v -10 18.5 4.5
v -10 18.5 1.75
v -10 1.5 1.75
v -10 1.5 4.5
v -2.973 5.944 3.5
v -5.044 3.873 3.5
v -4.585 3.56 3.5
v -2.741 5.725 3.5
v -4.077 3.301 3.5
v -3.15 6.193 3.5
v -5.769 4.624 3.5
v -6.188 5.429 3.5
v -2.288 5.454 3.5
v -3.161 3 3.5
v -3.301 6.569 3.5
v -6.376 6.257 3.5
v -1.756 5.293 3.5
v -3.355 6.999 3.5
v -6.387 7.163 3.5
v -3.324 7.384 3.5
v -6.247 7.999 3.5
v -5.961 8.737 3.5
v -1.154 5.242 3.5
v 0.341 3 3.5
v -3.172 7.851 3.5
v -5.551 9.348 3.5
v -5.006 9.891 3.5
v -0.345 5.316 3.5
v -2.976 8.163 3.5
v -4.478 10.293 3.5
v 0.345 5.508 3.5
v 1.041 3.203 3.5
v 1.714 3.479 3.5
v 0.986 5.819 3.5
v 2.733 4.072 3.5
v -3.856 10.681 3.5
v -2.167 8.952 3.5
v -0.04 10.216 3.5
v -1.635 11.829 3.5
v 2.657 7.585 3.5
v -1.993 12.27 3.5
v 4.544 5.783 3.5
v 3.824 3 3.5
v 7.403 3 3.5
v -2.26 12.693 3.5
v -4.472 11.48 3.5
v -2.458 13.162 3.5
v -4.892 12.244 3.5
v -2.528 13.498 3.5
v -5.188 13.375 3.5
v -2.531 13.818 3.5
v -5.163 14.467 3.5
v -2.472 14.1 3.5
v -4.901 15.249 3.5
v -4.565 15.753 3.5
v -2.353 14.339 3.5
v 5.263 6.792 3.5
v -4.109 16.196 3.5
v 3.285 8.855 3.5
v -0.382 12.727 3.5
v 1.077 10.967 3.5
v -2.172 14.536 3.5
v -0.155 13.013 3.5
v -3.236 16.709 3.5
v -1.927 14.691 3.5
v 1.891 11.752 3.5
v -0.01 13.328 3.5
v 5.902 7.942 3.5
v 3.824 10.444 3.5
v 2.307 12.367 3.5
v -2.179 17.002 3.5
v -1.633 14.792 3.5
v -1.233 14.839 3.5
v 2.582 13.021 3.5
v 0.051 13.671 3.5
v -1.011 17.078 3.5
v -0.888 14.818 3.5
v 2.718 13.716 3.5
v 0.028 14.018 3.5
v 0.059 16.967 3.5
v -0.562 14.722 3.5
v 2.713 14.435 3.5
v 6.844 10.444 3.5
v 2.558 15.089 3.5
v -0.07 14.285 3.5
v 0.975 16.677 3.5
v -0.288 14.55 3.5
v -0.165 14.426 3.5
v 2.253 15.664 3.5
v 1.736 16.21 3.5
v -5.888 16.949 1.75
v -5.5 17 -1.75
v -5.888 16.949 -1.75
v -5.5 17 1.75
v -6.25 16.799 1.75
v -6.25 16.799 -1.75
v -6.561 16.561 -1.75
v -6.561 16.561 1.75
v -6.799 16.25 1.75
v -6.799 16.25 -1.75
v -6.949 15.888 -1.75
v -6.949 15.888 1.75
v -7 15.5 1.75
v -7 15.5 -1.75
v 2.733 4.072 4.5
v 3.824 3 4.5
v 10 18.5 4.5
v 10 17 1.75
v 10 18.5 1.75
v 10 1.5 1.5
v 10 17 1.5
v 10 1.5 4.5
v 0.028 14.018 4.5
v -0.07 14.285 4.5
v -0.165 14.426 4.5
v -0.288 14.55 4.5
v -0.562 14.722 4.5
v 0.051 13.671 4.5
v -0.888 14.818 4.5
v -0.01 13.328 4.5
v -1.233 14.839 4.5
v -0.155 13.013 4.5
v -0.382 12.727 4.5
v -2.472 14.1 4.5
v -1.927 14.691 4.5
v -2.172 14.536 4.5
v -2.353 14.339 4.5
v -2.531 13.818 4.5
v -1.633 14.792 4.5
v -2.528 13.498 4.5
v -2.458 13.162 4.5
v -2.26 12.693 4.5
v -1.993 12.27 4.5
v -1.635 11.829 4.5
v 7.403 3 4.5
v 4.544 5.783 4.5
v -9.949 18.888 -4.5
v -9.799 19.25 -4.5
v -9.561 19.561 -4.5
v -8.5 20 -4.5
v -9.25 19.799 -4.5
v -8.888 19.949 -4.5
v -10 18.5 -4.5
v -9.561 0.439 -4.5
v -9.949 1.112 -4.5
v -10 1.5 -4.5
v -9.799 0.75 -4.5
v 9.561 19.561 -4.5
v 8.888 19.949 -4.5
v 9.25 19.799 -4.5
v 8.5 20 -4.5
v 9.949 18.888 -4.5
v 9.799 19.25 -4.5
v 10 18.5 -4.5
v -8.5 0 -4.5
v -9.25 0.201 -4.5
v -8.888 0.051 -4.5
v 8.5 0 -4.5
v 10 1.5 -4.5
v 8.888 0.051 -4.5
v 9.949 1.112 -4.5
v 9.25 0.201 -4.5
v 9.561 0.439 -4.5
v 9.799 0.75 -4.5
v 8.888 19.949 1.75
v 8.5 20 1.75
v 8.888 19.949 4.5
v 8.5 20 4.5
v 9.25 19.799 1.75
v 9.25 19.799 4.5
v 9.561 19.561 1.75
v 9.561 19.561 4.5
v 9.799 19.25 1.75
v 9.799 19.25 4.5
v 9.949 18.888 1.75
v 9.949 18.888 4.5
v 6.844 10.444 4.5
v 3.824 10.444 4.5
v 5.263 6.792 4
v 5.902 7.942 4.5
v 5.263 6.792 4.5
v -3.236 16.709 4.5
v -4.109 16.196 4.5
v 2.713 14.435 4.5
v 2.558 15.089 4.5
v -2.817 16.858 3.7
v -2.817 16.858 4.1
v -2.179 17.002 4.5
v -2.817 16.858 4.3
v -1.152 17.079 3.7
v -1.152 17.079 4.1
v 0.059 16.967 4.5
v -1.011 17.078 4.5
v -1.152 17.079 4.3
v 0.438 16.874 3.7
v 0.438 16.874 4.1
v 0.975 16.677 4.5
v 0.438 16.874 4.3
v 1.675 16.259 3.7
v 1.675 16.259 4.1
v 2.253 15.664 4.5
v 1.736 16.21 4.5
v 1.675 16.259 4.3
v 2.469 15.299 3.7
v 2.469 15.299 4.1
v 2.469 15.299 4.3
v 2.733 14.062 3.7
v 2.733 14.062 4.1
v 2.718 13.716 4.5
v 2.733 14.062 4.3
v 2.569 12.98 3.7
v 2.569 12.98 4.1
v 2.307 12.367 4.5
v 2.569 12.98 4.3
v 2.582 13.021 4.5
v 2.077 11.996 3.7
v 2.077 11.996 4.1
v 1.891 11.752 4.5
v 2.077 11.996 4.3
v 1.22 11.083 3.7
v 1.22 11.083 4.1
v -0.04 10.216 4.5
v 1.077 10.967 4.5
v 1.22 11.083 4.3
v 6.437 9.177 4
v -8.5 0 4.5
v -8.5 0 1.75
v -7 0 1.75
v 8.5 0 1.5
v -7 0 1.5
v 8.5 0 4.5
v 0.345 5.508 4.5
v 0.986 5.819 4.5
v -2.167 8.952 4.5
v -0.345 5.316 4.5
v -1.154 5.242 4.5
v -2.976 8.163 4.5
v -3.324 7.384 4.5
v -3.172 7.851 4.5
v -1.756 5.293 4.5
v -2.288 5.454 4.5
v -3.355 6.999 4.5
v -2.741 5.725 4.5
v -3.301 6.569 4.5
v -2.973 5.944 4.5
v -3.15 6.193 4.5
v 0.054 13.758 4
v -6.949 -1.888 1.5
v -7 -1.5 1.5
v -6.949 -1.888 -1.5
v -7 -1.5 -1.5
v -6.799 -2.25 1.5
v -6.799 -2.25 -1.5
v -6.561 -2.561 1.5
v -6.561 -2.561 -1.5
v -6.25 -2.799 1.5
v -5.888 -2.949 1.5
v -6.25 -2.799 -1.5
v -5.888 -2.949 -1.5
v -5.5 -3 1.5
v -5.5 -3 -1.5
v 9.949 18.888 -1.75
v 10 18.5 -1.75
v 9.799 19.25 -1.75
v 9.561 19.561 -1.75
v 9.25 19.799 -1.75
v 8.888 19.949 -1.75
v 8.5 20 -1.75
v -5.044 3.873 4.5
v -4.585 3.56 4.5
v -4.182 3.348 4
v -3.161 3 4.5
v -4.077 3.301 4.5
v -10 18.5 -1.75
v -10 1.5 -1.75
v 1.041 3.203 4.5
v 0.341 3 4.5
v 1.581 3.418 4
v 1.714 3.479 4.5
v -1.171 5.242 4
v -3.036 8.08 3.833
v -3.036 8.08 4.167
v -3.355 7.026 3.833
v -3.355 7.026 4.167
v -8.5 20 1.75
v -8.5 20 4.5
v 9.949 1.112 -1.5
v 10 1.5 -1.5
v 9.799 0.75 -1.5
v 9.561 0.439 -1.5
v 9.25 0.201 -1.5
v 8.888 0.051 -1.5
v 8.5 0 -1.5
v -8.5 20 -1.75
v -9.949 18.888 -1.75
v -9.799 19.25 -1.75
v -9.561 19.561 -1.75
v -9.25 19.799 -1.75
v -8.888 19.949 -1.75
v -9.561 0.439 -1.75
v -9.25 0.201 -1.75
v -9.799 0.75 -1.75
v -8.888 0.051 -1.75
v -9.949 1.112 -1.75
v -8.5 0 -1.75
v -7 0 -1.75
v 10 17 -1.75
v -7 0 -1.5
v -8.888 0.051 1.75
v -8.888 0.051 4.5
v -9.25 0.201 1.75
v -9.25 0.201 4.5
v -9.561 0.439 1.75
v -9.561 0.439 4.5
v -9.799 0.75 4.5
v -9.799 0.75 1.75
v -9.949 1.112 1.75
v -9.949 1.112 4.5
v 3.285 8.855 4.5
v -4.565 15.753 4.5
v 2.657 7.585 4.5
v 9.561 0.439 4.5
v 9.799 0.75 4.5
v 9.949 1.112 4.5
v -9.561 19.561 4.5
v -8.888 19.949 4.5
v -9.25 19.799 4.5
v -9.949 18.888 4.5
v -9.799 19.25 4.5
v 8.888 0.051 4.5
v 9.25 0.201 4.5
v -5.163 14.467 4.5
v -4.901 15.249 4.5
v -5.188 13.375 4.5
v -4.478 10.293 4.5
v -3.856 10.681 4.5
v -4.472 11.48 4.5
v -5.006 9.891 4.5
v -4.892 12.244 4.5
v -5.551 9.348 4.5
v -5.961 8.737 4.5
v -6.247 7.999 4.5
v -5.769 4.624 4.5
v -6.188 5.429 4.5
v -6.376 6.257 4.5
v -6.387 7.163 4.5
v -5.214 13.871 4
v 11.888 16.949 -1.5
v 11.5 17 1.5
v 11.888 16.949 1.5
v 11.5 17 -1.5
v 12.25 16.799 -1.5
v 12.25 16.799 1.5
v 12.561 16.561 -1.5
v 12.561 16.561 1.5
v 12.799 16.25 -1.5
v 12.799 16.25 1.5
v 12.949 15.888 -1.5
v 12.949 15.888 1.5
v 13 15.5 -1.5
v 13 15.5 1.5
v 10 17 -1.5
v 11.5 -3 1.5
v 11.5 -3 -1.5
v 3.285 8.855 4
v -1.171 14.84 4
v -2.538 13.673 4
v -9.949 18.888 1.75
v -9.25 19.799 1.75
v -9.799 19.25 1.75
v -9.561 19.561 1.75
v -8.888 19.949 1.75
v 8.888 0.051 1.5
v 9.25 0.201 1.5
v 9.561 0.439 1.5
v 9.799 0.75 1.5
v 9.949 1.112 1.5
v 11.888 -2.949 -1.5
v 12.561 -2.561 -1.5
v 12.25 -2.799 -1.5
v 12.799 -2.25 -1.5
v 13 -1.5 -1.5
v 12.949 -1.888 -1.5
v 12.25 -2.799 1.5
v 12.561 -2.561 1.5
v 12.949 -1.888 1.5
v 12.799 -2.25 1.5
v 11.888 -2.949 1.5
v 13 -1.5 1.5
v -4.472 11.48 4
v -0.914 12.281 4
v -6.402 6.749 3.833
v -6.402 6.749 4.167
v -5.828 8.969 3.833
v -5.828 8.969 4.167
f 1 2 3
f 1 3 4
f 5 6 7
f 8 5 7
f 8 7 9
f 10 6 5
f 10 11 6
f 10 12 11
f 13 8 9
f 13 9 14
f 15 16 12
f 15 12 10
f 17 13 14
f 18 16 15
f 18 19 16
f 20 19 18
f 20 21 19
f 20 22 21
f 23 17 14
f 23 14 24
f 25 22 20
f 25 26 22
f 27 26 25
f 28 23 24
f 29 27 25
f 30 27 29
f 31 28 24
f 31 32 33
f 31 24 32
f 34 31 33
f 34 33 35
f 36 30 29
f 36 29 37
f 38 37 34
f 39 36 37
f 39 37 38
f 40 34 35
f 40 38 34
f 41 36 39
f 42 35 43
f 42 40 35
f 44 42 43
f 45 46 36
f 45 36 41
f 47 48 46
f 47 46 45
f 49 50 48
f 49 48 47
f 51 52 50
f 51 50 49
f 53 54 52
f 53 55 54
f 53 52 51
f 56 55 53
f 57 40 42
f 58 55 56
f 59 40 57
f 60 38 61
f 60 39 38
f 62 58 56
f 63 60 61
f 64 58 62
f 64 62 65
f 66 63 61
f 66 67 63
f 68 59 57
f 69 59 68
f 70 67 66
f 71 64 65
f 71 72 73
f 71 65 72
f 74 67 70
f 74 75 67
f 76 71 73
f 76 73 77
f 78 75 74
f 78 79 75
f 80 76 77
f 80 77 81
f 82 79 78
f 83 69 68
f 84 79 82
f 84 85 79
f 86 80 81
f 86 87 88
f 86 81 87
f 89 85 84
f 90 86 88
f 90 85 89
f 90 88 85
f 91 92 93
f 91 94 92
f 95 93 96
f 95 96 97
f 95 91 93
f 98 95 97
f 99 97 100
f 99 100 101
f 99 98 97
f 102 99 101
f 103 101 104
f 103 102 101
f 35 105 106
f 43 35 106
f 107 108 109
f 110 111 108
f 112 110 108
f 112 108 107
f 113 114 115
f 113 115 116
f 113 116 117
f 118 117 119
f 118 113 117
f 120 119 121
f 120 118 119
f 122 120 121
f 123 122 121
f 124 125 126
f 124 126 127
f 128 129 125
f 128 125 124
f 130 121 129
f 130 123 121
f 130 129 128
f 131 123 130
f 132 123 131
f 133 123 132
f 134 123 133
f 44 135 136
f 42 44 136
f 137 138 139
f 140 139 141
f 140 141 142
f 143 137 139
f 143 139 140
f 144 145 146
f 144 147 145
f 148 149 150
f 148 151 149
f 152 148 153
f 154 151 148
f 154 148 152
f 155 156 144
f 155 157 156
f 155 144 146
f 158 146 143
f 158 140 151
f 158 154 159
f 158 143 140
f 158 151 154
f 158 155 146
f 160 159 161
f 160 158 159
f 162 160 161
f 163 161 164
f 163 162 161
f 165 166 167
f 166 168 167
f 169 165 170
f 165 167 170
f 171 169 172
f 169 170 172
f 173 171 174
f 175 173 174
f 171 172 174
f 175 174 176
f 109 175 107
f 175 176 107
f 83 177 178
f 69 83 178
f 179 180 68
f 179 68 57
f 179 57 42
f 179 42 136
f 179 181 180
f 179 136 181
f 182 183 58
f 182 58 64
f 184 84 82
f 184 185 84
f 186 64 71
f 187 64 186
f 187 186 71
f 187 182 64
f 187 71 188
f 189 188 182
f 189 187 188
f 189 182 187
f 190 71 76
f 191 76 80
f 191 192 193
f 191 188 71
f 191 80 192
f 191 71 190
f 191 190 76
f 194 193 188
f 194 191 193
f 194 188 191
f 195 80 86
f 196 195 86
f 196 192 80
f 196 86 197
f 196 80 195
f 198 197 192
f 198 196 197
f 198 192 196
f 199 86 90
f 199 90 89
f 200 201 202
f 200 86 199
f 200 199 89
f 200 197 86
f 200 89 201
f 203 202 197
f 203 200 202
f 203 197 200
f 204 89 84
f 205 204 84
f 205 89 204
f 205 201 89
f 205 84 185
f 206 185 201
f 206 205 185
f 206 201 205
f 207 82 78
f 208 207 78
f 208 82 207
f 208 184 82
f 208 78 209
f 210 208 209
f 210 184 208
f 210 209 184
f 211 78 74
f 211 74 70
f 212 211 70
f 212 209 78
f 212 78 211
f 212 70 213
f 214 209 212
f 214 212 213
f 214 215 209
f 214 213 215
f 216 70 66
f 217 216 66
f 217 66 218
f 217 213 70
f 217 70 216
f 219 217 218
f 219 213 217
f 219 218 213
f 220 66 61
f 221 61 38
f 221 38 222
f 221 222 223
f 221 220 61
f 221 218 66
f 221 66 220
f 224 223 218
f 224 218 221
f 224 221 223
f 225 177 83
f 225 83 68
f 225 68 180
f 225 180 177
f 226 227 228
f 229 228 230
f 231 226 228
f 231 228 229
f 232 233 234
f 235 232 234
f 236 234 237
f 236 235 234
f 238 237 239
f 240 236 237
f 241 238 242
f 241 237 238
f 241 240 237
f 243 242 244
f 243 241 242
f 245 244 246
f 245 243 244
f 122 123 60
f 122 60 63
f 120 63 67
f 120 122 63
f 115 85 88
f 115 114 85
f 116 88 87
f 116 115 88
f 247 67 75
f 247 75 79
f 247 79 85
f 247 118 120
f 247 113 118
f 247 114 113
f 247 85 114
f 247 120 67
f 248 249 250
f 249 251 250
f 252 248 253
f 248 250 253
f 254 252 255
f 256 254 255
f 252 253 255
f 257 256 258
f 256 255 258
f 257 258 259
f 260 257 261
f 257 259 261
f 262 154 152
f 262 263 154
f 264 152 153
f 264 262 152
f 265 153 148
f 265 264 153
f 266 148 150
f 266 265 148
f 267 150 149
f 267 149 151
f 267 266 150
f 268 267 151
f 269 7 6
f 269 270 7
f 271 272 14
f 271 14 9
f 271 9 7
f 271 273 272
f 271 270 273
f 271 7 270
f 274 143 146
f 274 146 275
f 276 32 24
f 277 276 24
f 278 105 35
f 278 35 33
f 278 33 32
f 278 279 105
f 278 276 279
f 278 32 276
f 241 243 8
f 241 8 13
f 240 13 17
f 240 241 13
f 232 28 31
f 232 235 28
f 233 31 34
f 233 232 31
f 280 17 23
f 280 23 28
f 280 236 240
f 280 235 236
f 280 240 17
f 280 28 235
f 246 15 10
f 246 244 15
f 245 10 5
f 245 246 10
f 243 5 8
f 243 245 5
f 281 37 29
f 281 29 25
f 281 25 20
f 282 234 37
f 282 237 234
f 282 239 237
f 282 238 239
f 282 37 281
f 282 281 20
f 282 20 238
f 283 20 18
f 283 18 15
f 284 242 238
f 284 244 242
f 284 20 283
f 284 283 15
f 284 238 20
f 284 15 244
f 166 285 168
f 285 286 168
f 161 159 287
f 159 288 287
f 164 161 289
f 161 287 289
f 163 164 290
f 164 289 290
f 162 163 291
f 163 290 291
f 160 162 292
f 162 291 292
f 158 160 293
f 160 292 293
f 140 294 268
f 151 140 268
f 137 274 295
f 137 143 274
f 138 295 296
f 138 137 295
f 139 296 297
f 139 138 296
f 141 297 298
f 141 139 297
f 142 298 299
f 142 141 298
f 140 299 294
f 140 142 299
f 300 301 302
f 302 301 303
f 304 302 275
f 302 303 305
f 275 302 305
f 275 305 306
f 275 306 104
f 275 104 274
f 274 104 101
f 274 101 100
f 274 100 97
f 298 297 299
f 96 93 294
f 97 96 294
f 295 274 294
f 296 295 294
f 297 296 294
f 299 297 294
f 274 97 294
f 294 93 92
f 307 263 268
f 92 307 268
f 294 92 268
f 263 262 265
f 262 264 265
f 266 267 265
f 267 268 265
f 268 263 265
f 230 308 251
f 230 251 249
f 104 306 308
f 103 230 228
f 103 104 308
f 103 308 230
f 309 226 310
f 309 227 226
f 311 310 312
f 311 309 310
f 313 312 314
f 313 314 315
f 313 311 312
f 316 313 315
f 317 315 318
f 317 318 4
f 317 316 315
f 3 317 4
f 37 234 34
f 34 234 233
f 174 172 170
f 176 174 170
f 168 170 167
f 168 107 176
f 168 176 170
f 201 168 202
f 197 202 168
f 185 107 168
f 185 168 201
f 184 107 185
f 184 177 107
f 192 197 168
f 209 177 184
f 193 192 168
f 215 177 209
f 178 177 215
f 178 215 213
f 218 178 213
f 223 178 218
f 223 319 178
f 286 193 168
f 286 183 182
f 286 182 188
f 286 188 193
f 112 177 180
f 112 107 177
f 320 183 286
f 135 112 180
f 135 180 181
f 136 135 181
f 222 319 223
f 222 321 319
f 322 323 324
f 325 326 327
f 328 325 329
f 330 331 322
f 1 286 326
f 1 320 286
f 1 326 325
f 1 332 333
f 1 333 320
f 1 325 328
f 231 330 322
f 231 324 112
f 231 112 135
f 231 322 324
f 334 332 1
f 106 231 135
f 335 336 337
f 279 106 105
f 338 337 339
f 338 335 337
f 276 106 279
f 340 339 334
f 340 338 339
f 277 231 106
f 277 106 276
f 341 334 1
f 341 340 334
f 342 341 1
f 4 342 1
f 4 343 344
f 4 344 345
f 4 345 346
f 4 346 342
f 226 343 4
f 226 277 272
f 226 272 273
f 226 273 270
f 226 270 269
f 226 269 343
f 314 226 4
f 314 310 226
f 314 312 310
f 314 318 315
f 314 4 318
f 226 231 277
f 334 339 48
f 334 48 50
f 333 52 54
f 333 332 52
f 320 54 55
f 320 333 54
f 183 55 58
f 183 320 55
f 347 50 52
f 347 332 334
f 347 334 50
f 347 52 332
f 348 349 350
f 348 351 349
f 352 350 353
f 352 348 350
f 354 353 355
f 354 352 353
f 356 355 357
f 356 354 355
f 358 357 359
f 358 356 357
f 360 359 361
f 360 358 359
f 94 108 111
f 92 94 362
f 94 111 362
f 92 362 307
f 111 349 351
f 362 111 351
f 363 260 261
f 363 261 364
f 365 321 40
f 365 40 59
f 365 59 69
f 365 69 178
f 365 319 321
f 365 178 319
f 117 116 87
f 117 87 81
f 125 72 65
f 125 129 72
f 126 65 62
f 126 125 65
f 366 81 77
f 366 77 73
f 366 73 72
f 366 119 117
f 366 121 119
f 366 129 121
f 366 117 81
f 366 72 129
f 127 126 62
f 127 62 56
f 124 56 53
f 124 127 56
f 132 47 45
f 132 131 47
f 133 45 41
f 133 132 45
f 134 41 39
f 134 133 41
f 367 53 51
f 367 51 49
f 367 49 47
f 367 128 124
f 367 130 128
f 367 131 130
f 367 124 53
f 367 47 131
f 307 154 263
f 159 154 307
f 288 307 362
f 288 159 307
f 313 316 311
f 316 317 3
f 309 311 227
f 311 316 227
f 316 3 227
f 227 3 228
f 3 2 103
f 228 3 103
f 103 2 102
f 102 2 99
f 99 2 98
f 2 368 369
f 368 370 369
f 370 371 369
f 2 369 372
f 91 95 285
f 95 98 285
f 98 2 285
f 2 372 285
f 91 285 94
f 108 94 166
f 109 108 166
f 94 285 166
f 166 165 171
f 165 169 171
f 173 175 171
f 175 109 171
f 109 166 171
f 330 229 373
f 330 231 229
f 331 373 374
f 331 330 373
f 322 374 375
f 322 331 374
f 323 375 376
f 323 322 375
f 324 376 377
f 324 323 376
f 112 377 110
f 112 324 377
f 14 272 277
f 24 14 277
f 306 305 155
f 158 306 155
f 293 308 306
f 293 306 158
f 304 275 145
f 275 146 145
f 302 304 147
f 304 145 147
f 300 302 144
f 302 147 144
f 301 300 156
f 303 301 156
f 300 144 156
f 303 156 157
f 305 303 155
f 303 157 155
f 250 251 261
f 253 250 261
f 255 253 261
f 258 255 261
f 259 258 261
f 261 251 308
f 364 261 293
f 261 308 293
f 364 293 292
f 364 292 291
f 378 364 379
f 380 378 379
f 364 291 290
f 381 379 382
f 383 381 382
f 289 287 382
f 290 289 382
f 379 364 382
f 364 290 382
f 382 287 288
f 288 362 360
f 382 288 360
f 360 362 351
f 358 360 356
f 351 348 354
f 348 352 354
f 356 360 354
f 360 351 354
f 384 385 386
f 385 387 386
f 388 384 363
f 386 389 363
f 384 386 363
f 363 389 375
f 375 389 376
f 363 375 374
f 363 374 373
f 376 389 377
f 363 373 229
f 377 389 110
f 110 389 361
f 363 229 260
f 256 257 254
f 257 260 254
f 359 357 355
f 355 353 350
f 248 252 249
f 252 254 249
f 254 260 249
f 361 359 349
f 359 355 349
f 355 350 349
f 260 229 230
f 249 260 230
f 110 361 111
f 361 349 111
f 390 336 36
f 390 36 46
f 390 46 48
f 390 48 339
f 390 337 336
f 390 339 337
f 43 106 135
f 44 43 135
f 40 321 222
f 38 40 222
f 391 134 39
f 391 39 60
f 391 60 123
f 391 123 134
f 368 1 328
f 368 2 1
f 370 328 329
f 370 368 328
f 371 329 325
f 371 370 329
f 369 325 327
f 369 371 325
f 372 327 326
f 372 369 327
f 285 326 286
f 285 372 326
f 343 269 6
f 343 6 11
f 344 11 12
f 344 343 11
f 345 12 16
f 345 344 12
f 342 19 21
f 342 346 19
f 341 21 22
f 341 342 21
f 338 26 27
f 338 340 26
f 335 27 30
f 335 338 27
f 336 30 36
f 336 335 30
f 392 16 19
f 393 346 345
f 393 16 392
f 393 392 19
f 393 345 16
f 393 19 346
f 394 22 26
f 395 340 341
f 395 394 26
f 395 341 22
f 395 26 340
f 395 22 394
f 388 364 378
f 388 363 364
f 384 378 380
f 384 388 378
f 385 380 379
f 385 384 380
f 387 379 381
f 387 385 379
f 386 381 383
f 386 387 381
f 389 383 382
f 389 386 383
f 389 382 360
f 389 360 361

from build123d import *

# Parameters (mm, degrees)
F0_W     = 14
F0_H     = 3
F0_W_2   = 3
F1_DEPTH = 20
F2_DEPTH = 3
F3_W     = 3
F3_H     = 3
F4_DEPTH = 100
F5_W     = 3
F5_H     = 3.5
F6_DEPTH = 100
F7_R     = 1.5
F9_DEPTH = 1


with BuildPart() as f1:
    # F0 (on Front) → F1 (new body)
    with BuildSketch(Plane.XZ):
        Polygon((10, 1.5), (10, 4.5), (-10, 4.5), (-10, 1.5), (-7, 1.5), (7, 1.5), align=None)
        Rectangle(F0_W, F0_H)
        with Locations((11.5, 0)):
            Rectangle(F0_W_2, F0_H)
        with Locations((8.5, 0)):
            Rectangle(F0_W_2, F0_H)
        with Locations((-8.5, 0)):
            Rectangle(F0_W_2, F0_H)
        Polygon((10, -4.5), (10, -1.5), (7, -1.5), (-7, -1.5), (-10, -1.5), (-10, -4.5), align=None)
    extrude(amount=-F1_DEPTH)

    # F0 (on Front) → F2 (join)
    with BuildSketch(Plane.XZ):
        with Locations((-8.5, 0)):
            Rectangle(F0_W_2, F0_H)
        Rectangle(F0_W, F0_H)
        with Locations((8.5, 0)):
            Rectangle(F0_W_2, F0_H)
        with Locations((11.5, 0)):
            Rectangle(F0_W_2, F0_H)
    extrude(amount=F2_DEPTH)

    # F3 (on face) → F4 (cut)
    with BuildSketch(Plane.YZ.offset(13)):
        Polygon((23, -1.75), (23, 1.75), (17, 1.75), (17, 1.5), (20, 1.5), (20, -1.5), (17, -1.5), (17, -1.75), align=None)
        with Locations((18.5, 0)):
            Rectangle(F3_W, F3_H)
    extrude(amount=-F4_DEPTH, mode=Mode.SUBTRACT)

    # F5 (on face) → F6 (cut)
    with BuildSketch(Plane(origin=(0, 17, 0), x_dir=(-1, 0, 0), z_dir=(0, 1, 0))):
        with Locations((11.5, 0)):
            Rectangle(F5_W, F5_H)
        with Locations((8.5, 0)):
            Rectangle(F5_W, F5_H)
    extrude(amount=-F6_DEPTH, mode=Mode.SUBTRACT)

    # F7
    f7_edges = [f1.edges().sort_by_distance(p)[0] for p in [
        (-7, -3, 0),
        (13, -3, 0),
        (10, 0, 3),
        (10, 0, -3),
        (-10, 0, -3.125),
        (-10, 0, 3.125),
        (-7, 17, 0),
        (-10, 20, 3.125),
        (-10, 20, -3.125),
        (13, 17, 0),
        (10, 20, 3.125),
        (10, 20, -3.125),
    ]]
    fillet(f7_edges, radius=F7_R)

    # F8 (on face) → F9 (cut)
    with BuildSketch(Plane.XY.offset(4.5)):
        with BuildLine():
            Line((3.824145146, 3), (7.4031382015, 3))
            Line((7.4031382015, 3), (4.5441972293, 5.7829861111))
            add(Edge.make_bspline(
                [(5.902270146, 7.9416232639), (5.3037458404, 6.7217881944), (4.5441972293, 5.7829861111)],
                knots=[0, 0, 0, 1, 1, 1], degree=2))
            add(Edge.make_bspline(
                [(6.8441104237, 10.4435763889), (6.5007944515, 9.1614583333), (5.902270146, 7.9416232639)],
                knots=[0, 0, 0, 1, 1, 1], degree=2))
            Line((6.8441104237, 10.4435763889), (3.824145146, 10.4435763889))
            add(Edge.make_bspline(
                [(2.6574784793, 7.5846354167), (3.3289194515, 8.6966145833), (3.824145146, 10.4435763889)],
                knots=[0, 0, 0, 1, 1, 1], degree=2))
            Line((2.6574784793, 7.5846354167), (-0.0404381874, 10.2157118056))
            add(Edge.make_bspline(
                [(2.0771833404, 11.99609375), (1.4209333404, 11.0603298611), (-0.0404381874, 10.2157118056)],
                knots=[0, 0, 0, 1, 1, 1], degree=2))
            add(Edge.make_bspline(
                [(2.7334333404, 14.0620659722), (2.7334333404, 12.9318576389), (2.0771833404, 11.99609375)],
                knots=[0, 0, 0, 1, 1, 1], degree=2))
            add(Edge.make_bspline(
                [(1.6746225765, 16.2586805556), (2.7334333404, 15.4383680556), (2.7334333404, 14.0620659722)],
                knots=[0, 0, 0, 1, 1, 1], degree=2))
            add(Edge.make_bspline(
                [(-1.152417354, 17.0789930556), (0.6158118126, 17.0789930556), (1.6746225765, 16.2586805556)],
                knots=[0, 0, 0, 1, 1, 1], degree=2))
            add(Edge.make_bspline(
                [(-4.1085805485, 16.1963975694), (-3.0026777707, 17.0789930556), (-1.152417354, 17.0789930556)],
                knots=[0, 0, 0, 1, 1, 1], degree=2))
            add(Edge.make_bspline(
                [(-5.2144833263, 13.8706597222), (-5.2144833263, 15.3138020833), (-4.1085805485, 16.1963975694)],
                knots=[0, 0, 0, 1, 1, 1], degree=2))
            add(Edge.make_bspline(
                [(-4.8924347151, 12.2437065972), (-5.2144833263, 12.9895833333), (-5.2144833263, 13.8706597222)],
                knots=[0, 0, 0, 1, 1, 1], degree=2))
            add(Edge.make_bspline(
                [(-3.8564104096, 10.6805555556), (-4.570386104, 11.4978298611), (-4.8924347151, 12.2437065972)],
                knots=[0, 0, 0, 1, 1, 1], degree=2))
            add(Edge.make_bspline(
                [(-5.828198604, 8.9685329861), (-5.253979854, 9.8845486111), (-3.8564104096, 10.6805555556)],
                knots=[0, 0, 0, 1, 1, 1], degree=2))
            add(Edge.make_bspline(
                [(-6.402417354, 6.7491319444), (-6.402417354, 8.0525173611), (-5.828198604, 8.9685329861)],
                knots=[0, 0, 0, 1, 1, 1], degree=2))
            add(Edge.make_bspline(
                [(-5.0443444374, 3.8734809028), (-6.402417354, 4.9383680556), (-6.402417354, 6.7491319444)],
                knots=[0, 0, 0, 1, 1, 1], degree=2))
            add(Edge.make_bspline(
                [(-3.1611686995, 3), (-4.2620419441, 3.260064742), (-5.0443444374, 3.8734809028)],
                knots=[0.4239613473, 0.4239613473, 0.4239613473, 1, 1, 1], degree=2))
            Line((-3.1611686995, 3), (0.3406843845, 3))
            add(Edge.make_bspline(
                [(2.7334333404, 4.0724826389), (1.6254830234, 3.300443557), (0.3406843845, 3)],
                knots=[0, 0, 0, 0.6108441088, 0.6108441088, 0.6108441088], degree=2))
            Line((2.7334333404, 4.0724826389), (3.824145146, 3))
        make_face()
        with BuildLine():
            add(Edge.make_bspline(
                [(-3.3551083263, 7.0256076389), (-3.3551083263, 6.2083333333), (-2.7413930485, 5.7252604167)],
                knots=[0, 0, 0, 1, 1, 1], degree=2))
            add(Edge.make_bspline(
                [(-3.0360979096, 8.0798611111), (-3.3551083263, 7.6241319444), (-3.3551083263, 7.0256076389)],
                knots=[0, 0, 0, 1, 1, 1], degree=2))
            add(Edge.make_bspline(
                [(-2.1671742985, 8.9518229167), (-2.7170874929, 8.5355902778), (-3.0360979096, 8.0798611111)],
                knots=[0, 0, 0, 1, 1, 1], degree=2))
            Line((-2.1671742985, 8.9518229167), (0.9864715349, 5.8194444444))
            add(Edge.make_bspline(
                [(-1.1706465207, 5.2421875), (0.0264020904, 5.2421875), (0.9864715349, 5.8194444444)],
                knots=[0, 0, 0, 1, 1, 1], degree=2))
            add(Edge.make_bspline(
                [(-2.7413930485, 5.7252604167), (-2.1276777707, 5.2421875), (-1.1706465207, 5.2421875)],
                knots=[0, 0, 0, 1, 1, 1], degree=2))
        make_face(mode=Mode.SUBTRACT)
        with BuildLine():
            add(Edge.make_bspline(
                [(0.0537458404, 13.7582465278), (0.0537458404, 14.2595486111), (-0.2880510346, 14.5496961806)],
                knots=[0, 0, 0, 1, 1, 1], degree=2))
            add(Edge.make_bspline(
                [(-0.3822350624, 12.7267795139), (0.0537458404, 13.1688368056), (0.0537458404, 13.7582465278)],
                knots=[0, 0, 0, 1, 1, 1], degree=2))
            add(Edge.make_bspline(
                [(-1.6354902707, 11.8289930556), (-0.8182159651, 12.2847222222), (-0.3822350624, 12.7267795139)],
                knots=[0, 0, 0, 1, 1, 1], degree=2))
            add(Edge.make_bspline(
                [(-2.5378340207, 13.6731770833), (-2.5378340207, 12.8376736111), (-1.6354902707, 11.8289930556)],
                knots=[0, 0, 0, 1, 1, 1], degree=2))
            add(Edge.make_bspline(
                [(-2.1717315901, 14.5360243056), (-2.5378340207, 14.2322048611), (-2.5378340207, 13.6731770833)],
                knots=[0, 0, 0, 1, 1, 1], degree=2))
            add(Edge.make_bspline(
                [(-1.1706465207, 14.83984375), (-1.8056291596, 14.83984375), (-2.1717315901, 14.5360243056)],
                knots=[0, 0, 0, 1, 1, 1], degree=2))
            add(Edge.make_bspline(
                [(-0.2880510346, 14.5496961806), (-0.6298479096, 14.83984375), (-1.1706465207, 14.83984375)],
                knots=[0, 0, 0, 1, 1, 1], degree=2))
        make_face(mode=Mode.SUBTRACT)
    extrude(amount=-F9_DEPTH, mode=Mode.SUBTRACT)


solid = f1.part
